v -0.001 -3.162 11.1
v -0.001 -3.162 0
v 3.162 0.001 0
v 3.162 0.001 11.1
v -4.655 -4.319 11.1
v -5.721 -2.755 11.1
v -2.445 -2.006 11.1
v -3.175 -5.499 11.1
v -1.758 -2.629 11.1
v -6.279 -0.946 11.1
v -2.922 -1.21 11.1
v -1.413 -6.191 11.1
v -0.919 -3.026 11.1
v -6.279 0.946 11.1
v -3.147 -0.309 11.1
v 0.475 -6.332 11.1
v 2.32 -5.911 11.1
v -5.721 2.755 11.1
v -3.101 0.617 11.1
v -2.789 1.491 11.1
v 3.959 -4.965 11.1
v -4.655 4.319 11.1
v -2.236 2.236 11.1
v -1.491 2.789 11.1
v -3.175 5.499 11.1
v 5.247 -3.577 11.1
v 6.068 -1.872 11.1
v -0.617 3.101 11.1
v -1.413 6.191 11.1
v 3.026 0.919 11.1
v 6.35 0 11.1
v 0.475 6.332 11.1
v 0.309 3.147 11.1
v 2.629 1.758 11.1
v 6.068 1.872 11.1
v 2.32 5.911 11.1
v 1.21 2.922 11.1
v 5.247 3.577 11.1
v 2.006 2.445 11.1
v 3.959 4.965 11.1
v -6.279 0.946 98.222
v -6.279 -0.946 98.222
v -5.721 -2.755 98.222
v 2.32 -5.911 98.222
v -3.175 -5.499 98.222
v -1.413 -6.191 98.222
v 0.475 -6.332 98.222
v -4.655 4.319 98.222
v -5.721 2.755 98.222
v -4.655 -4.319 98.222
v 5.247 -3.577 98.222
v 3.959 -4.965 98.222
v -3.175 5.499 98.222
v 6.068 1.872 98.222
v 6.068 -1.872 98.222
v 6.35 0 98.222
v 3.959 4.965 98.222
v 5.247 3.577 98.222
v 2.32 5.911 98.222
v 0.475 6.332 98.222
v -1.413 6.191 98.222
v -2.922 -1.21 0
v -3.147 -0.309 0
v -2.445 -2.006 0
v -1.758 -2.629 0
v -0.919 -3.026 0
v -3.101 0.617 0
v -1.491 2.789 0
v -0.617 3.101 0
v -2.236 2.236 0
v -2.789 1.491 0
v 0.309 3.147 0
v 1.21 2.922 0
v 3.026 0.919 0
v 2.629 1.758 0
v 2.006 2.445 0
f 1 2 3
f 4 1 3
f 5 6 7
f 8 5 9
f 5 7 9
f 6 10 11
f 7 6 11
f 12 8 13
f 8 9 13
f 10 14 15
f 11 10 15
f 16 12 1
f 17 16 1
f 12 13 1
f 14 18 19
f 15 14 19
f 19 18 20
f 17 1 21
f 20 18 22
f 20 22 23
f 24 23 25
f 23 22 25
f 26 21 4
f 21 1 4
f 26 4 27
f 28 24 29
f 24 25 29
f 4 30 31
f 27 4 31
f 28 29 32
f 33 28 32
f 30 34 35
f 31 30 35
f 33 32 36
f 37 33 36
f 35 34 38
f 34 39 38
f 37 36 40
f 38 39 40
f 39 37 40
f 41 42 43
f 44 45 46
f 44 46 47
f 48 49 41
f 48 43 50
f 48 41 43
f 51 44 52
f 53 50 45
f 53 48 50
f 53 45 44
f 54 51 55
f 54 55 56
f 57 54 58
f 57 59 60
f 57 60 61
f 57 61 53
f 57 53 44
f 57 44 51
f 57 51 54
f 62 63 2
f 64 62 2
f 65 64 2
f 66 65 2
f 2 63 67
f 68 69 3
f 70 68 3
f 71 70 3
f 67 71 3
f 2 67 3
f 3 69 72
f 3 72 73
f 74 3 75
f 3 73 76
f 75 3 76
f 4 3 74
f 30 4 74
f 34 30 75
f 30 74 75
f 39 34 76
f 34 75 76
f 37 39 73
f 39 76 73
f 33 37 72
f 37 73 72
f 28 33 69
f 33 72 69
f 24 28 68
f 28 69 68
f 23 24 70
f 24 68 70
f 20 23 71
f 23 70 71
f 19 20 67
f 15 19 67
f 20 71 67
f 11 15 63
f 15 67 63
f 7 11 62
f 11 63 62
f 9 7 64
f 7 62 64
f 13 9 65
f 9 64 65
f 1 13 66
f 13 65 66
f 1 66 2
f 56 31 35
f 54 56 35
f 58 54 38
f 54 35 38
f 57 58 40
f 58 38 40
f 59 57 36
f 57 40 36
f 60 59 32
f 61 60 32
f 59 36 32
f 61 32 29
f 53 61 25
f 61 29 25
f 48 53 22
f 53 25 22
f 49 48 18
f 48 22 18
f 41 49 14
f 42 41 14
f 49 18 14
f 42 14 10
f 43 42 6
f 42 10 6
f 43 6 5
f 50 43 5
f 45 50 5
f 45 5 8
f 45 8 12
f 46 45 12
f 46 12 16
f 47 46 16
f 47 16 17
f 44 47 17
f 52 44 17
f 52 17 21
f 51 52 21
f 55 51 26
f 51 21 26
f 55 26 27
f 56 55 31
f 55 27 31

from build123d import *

# Parameters (mm, degrees)
SKETCH1_R               = 3.1623
BOSS_EXTRUDE1_DEPTH     = 11.0998
CUT_EXTRUDE1_DEPTH      = 1
CUT_EXTRUDE1_DEPTH_BACK = 12.0998
SKETCH3_R               = 6.35
BOSS_EXTRUDE2_DEPTH     = 87.122


with BuildPart() as part:
    # Sketch1 → Boss-Extrude1 (new body)
    with BuildSketch(Plane.XY):
        Circle(SKETCH1_R)
    extrude(amount=BOSS_EXTRUDE1_DEPTH)

    # Sketch2 → Cut-Extrude1 (cut, two sides)
    with BuildSketch(Plane(origin=(0, 0, 0), x_dir=(-1, 0, 0), z_dir=(0, 0, -1))) as cut_extrude1_sk:
        Polygon((17.073178183, -20.234228338), (0.001249598, -3.162299753), (-3.162299753, 0.001249598), (-20.234228338, 17.073178183), (-54.378085507, -17.070678986), (-17.070678986, -54.378085507), align=None)
    extrude(amount=CUT_EXTRUDE1_DEPTH, mode=Mode.SUBTRACT)
    extrude(cut_extrude1_sk.sketch, amount=-CUT_EXTRUDE1_DEPTH_BACK, mode=Mode.SUBTRACT)

    # Sketch3 → Boss-Extrude2 (add)
    with BuildSketch(Plane.XY.offset(11.0998)):
        Circle(SKETCH3_R)
    extrude(amount=BOSS_EXTRUDE2_DEPTH)


solid = part.part
